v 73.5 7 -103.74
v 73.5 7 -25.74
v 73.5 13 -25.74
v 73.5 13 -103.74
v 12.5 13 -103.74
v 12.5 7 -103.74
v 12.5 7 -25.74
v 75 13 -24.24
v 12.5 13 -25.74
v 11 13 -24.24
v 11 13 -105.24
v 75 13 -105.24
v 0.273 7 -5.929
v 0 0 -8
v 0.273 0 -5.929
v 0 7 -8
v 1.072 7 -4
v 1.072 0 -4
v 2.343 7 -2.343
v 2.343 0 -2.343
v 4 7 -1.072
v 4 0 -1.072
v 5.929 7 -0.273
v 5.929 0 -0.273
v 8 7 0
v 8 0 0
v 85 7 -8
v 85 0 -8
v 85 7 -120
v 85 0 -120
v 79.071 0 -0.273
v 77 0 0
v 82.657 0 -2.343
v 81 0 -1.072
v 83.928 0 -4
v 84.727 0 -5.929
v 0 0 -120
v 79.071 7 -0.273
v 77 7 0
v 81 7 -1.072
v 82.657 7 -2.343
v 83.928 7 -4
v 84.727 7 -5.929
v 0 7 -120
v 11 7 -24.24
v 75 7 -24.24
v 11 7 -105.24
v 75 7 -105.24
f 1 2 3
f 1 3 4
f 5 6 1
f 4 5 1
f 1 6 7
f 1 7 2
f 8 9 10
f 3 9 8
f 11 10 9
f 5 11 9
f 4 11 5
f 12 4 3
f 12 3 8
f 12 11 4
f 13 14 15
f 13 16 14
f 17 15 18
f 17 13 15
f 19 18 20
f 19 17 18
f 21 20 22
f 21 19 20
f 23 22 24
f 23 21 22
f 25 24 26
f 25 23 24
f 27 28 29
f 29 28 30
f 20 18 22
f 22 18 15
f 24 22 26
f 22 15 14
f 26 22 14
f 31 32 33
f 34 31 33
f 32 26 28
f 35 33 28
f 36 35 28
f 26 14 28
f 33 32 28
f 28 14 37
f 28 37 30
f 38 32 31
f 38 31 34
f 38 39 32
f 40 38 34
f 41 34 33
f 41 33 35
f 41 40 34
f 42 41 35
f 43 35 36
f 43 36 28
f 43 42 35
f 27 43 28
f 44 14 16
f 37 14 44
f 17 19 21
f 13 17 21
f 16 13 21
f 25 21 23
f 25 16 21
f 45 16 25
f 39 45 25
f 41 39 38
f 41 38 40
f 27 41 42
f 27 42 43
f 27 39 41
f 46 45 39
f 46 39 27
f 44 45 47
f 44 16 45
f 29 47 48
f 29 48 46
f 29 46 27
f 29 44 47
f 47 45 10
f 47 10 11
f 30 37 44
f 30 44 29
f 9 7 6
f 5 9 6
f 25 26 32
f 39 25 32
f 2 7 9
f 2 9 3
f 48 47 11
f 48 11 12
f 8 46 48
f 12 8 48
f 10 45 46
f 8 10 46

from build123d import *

# Parameters (mm, degrees)
SKETCH1_W           = 85
SKETCH1_H           = 120
BOSS_EXTRUDE1_DEPTH = 7
FILLET1_R           = 8
SKETCH2_W           = 64
SKETCH2_H           = 81
SKETCH2_W_2         = 61
SKETCH2_H_2         = 78
BOSS_EXTRUDE2_DEPTH = 6


with BuildPart() as part:
    # Sketch1 → Boss-Extrude1 (new body)
    with BuildSketch(Plane(origin=(0, 0, 0), x_dir=(1, 0, 0), z_dir=(0, 1, 0))):
        with Locations((42.5, 60)):
            Rectangle(SKETCH1_W, SKETCH1_H)
    extrude(amount=BOSS_EXTRUDE1_DEPTH)

    # Fillet1
    fillet1_edges = [part.edges().sort_by_distance(p)[0] for p in [
        (85, 3.5, 0),
        (0, 3.5, 0),
    ]]
    fillet(fillet1_edges, radius=FILLET1_R)

    # Sketch2 → Boss-Extrude2 (add)
    with BuildSketch(Plane(origin=(0, 7, 0), x_dir=(1, 0, 0), z_dir=(0, 1, 0))):
        with Locations((43, 64.739607224)):
            Rectangle(SKETCH2_W, SKETCH2_H)
        with Locations((43, 64.739607224)):
            Rectangle(SKETCH2_W_2, SKETCH2_H_2, mode=Mode.SUBTRACT)
    extrude(amount=BOSS_EXTRUDE2_DEPTH)


solid = part.part
